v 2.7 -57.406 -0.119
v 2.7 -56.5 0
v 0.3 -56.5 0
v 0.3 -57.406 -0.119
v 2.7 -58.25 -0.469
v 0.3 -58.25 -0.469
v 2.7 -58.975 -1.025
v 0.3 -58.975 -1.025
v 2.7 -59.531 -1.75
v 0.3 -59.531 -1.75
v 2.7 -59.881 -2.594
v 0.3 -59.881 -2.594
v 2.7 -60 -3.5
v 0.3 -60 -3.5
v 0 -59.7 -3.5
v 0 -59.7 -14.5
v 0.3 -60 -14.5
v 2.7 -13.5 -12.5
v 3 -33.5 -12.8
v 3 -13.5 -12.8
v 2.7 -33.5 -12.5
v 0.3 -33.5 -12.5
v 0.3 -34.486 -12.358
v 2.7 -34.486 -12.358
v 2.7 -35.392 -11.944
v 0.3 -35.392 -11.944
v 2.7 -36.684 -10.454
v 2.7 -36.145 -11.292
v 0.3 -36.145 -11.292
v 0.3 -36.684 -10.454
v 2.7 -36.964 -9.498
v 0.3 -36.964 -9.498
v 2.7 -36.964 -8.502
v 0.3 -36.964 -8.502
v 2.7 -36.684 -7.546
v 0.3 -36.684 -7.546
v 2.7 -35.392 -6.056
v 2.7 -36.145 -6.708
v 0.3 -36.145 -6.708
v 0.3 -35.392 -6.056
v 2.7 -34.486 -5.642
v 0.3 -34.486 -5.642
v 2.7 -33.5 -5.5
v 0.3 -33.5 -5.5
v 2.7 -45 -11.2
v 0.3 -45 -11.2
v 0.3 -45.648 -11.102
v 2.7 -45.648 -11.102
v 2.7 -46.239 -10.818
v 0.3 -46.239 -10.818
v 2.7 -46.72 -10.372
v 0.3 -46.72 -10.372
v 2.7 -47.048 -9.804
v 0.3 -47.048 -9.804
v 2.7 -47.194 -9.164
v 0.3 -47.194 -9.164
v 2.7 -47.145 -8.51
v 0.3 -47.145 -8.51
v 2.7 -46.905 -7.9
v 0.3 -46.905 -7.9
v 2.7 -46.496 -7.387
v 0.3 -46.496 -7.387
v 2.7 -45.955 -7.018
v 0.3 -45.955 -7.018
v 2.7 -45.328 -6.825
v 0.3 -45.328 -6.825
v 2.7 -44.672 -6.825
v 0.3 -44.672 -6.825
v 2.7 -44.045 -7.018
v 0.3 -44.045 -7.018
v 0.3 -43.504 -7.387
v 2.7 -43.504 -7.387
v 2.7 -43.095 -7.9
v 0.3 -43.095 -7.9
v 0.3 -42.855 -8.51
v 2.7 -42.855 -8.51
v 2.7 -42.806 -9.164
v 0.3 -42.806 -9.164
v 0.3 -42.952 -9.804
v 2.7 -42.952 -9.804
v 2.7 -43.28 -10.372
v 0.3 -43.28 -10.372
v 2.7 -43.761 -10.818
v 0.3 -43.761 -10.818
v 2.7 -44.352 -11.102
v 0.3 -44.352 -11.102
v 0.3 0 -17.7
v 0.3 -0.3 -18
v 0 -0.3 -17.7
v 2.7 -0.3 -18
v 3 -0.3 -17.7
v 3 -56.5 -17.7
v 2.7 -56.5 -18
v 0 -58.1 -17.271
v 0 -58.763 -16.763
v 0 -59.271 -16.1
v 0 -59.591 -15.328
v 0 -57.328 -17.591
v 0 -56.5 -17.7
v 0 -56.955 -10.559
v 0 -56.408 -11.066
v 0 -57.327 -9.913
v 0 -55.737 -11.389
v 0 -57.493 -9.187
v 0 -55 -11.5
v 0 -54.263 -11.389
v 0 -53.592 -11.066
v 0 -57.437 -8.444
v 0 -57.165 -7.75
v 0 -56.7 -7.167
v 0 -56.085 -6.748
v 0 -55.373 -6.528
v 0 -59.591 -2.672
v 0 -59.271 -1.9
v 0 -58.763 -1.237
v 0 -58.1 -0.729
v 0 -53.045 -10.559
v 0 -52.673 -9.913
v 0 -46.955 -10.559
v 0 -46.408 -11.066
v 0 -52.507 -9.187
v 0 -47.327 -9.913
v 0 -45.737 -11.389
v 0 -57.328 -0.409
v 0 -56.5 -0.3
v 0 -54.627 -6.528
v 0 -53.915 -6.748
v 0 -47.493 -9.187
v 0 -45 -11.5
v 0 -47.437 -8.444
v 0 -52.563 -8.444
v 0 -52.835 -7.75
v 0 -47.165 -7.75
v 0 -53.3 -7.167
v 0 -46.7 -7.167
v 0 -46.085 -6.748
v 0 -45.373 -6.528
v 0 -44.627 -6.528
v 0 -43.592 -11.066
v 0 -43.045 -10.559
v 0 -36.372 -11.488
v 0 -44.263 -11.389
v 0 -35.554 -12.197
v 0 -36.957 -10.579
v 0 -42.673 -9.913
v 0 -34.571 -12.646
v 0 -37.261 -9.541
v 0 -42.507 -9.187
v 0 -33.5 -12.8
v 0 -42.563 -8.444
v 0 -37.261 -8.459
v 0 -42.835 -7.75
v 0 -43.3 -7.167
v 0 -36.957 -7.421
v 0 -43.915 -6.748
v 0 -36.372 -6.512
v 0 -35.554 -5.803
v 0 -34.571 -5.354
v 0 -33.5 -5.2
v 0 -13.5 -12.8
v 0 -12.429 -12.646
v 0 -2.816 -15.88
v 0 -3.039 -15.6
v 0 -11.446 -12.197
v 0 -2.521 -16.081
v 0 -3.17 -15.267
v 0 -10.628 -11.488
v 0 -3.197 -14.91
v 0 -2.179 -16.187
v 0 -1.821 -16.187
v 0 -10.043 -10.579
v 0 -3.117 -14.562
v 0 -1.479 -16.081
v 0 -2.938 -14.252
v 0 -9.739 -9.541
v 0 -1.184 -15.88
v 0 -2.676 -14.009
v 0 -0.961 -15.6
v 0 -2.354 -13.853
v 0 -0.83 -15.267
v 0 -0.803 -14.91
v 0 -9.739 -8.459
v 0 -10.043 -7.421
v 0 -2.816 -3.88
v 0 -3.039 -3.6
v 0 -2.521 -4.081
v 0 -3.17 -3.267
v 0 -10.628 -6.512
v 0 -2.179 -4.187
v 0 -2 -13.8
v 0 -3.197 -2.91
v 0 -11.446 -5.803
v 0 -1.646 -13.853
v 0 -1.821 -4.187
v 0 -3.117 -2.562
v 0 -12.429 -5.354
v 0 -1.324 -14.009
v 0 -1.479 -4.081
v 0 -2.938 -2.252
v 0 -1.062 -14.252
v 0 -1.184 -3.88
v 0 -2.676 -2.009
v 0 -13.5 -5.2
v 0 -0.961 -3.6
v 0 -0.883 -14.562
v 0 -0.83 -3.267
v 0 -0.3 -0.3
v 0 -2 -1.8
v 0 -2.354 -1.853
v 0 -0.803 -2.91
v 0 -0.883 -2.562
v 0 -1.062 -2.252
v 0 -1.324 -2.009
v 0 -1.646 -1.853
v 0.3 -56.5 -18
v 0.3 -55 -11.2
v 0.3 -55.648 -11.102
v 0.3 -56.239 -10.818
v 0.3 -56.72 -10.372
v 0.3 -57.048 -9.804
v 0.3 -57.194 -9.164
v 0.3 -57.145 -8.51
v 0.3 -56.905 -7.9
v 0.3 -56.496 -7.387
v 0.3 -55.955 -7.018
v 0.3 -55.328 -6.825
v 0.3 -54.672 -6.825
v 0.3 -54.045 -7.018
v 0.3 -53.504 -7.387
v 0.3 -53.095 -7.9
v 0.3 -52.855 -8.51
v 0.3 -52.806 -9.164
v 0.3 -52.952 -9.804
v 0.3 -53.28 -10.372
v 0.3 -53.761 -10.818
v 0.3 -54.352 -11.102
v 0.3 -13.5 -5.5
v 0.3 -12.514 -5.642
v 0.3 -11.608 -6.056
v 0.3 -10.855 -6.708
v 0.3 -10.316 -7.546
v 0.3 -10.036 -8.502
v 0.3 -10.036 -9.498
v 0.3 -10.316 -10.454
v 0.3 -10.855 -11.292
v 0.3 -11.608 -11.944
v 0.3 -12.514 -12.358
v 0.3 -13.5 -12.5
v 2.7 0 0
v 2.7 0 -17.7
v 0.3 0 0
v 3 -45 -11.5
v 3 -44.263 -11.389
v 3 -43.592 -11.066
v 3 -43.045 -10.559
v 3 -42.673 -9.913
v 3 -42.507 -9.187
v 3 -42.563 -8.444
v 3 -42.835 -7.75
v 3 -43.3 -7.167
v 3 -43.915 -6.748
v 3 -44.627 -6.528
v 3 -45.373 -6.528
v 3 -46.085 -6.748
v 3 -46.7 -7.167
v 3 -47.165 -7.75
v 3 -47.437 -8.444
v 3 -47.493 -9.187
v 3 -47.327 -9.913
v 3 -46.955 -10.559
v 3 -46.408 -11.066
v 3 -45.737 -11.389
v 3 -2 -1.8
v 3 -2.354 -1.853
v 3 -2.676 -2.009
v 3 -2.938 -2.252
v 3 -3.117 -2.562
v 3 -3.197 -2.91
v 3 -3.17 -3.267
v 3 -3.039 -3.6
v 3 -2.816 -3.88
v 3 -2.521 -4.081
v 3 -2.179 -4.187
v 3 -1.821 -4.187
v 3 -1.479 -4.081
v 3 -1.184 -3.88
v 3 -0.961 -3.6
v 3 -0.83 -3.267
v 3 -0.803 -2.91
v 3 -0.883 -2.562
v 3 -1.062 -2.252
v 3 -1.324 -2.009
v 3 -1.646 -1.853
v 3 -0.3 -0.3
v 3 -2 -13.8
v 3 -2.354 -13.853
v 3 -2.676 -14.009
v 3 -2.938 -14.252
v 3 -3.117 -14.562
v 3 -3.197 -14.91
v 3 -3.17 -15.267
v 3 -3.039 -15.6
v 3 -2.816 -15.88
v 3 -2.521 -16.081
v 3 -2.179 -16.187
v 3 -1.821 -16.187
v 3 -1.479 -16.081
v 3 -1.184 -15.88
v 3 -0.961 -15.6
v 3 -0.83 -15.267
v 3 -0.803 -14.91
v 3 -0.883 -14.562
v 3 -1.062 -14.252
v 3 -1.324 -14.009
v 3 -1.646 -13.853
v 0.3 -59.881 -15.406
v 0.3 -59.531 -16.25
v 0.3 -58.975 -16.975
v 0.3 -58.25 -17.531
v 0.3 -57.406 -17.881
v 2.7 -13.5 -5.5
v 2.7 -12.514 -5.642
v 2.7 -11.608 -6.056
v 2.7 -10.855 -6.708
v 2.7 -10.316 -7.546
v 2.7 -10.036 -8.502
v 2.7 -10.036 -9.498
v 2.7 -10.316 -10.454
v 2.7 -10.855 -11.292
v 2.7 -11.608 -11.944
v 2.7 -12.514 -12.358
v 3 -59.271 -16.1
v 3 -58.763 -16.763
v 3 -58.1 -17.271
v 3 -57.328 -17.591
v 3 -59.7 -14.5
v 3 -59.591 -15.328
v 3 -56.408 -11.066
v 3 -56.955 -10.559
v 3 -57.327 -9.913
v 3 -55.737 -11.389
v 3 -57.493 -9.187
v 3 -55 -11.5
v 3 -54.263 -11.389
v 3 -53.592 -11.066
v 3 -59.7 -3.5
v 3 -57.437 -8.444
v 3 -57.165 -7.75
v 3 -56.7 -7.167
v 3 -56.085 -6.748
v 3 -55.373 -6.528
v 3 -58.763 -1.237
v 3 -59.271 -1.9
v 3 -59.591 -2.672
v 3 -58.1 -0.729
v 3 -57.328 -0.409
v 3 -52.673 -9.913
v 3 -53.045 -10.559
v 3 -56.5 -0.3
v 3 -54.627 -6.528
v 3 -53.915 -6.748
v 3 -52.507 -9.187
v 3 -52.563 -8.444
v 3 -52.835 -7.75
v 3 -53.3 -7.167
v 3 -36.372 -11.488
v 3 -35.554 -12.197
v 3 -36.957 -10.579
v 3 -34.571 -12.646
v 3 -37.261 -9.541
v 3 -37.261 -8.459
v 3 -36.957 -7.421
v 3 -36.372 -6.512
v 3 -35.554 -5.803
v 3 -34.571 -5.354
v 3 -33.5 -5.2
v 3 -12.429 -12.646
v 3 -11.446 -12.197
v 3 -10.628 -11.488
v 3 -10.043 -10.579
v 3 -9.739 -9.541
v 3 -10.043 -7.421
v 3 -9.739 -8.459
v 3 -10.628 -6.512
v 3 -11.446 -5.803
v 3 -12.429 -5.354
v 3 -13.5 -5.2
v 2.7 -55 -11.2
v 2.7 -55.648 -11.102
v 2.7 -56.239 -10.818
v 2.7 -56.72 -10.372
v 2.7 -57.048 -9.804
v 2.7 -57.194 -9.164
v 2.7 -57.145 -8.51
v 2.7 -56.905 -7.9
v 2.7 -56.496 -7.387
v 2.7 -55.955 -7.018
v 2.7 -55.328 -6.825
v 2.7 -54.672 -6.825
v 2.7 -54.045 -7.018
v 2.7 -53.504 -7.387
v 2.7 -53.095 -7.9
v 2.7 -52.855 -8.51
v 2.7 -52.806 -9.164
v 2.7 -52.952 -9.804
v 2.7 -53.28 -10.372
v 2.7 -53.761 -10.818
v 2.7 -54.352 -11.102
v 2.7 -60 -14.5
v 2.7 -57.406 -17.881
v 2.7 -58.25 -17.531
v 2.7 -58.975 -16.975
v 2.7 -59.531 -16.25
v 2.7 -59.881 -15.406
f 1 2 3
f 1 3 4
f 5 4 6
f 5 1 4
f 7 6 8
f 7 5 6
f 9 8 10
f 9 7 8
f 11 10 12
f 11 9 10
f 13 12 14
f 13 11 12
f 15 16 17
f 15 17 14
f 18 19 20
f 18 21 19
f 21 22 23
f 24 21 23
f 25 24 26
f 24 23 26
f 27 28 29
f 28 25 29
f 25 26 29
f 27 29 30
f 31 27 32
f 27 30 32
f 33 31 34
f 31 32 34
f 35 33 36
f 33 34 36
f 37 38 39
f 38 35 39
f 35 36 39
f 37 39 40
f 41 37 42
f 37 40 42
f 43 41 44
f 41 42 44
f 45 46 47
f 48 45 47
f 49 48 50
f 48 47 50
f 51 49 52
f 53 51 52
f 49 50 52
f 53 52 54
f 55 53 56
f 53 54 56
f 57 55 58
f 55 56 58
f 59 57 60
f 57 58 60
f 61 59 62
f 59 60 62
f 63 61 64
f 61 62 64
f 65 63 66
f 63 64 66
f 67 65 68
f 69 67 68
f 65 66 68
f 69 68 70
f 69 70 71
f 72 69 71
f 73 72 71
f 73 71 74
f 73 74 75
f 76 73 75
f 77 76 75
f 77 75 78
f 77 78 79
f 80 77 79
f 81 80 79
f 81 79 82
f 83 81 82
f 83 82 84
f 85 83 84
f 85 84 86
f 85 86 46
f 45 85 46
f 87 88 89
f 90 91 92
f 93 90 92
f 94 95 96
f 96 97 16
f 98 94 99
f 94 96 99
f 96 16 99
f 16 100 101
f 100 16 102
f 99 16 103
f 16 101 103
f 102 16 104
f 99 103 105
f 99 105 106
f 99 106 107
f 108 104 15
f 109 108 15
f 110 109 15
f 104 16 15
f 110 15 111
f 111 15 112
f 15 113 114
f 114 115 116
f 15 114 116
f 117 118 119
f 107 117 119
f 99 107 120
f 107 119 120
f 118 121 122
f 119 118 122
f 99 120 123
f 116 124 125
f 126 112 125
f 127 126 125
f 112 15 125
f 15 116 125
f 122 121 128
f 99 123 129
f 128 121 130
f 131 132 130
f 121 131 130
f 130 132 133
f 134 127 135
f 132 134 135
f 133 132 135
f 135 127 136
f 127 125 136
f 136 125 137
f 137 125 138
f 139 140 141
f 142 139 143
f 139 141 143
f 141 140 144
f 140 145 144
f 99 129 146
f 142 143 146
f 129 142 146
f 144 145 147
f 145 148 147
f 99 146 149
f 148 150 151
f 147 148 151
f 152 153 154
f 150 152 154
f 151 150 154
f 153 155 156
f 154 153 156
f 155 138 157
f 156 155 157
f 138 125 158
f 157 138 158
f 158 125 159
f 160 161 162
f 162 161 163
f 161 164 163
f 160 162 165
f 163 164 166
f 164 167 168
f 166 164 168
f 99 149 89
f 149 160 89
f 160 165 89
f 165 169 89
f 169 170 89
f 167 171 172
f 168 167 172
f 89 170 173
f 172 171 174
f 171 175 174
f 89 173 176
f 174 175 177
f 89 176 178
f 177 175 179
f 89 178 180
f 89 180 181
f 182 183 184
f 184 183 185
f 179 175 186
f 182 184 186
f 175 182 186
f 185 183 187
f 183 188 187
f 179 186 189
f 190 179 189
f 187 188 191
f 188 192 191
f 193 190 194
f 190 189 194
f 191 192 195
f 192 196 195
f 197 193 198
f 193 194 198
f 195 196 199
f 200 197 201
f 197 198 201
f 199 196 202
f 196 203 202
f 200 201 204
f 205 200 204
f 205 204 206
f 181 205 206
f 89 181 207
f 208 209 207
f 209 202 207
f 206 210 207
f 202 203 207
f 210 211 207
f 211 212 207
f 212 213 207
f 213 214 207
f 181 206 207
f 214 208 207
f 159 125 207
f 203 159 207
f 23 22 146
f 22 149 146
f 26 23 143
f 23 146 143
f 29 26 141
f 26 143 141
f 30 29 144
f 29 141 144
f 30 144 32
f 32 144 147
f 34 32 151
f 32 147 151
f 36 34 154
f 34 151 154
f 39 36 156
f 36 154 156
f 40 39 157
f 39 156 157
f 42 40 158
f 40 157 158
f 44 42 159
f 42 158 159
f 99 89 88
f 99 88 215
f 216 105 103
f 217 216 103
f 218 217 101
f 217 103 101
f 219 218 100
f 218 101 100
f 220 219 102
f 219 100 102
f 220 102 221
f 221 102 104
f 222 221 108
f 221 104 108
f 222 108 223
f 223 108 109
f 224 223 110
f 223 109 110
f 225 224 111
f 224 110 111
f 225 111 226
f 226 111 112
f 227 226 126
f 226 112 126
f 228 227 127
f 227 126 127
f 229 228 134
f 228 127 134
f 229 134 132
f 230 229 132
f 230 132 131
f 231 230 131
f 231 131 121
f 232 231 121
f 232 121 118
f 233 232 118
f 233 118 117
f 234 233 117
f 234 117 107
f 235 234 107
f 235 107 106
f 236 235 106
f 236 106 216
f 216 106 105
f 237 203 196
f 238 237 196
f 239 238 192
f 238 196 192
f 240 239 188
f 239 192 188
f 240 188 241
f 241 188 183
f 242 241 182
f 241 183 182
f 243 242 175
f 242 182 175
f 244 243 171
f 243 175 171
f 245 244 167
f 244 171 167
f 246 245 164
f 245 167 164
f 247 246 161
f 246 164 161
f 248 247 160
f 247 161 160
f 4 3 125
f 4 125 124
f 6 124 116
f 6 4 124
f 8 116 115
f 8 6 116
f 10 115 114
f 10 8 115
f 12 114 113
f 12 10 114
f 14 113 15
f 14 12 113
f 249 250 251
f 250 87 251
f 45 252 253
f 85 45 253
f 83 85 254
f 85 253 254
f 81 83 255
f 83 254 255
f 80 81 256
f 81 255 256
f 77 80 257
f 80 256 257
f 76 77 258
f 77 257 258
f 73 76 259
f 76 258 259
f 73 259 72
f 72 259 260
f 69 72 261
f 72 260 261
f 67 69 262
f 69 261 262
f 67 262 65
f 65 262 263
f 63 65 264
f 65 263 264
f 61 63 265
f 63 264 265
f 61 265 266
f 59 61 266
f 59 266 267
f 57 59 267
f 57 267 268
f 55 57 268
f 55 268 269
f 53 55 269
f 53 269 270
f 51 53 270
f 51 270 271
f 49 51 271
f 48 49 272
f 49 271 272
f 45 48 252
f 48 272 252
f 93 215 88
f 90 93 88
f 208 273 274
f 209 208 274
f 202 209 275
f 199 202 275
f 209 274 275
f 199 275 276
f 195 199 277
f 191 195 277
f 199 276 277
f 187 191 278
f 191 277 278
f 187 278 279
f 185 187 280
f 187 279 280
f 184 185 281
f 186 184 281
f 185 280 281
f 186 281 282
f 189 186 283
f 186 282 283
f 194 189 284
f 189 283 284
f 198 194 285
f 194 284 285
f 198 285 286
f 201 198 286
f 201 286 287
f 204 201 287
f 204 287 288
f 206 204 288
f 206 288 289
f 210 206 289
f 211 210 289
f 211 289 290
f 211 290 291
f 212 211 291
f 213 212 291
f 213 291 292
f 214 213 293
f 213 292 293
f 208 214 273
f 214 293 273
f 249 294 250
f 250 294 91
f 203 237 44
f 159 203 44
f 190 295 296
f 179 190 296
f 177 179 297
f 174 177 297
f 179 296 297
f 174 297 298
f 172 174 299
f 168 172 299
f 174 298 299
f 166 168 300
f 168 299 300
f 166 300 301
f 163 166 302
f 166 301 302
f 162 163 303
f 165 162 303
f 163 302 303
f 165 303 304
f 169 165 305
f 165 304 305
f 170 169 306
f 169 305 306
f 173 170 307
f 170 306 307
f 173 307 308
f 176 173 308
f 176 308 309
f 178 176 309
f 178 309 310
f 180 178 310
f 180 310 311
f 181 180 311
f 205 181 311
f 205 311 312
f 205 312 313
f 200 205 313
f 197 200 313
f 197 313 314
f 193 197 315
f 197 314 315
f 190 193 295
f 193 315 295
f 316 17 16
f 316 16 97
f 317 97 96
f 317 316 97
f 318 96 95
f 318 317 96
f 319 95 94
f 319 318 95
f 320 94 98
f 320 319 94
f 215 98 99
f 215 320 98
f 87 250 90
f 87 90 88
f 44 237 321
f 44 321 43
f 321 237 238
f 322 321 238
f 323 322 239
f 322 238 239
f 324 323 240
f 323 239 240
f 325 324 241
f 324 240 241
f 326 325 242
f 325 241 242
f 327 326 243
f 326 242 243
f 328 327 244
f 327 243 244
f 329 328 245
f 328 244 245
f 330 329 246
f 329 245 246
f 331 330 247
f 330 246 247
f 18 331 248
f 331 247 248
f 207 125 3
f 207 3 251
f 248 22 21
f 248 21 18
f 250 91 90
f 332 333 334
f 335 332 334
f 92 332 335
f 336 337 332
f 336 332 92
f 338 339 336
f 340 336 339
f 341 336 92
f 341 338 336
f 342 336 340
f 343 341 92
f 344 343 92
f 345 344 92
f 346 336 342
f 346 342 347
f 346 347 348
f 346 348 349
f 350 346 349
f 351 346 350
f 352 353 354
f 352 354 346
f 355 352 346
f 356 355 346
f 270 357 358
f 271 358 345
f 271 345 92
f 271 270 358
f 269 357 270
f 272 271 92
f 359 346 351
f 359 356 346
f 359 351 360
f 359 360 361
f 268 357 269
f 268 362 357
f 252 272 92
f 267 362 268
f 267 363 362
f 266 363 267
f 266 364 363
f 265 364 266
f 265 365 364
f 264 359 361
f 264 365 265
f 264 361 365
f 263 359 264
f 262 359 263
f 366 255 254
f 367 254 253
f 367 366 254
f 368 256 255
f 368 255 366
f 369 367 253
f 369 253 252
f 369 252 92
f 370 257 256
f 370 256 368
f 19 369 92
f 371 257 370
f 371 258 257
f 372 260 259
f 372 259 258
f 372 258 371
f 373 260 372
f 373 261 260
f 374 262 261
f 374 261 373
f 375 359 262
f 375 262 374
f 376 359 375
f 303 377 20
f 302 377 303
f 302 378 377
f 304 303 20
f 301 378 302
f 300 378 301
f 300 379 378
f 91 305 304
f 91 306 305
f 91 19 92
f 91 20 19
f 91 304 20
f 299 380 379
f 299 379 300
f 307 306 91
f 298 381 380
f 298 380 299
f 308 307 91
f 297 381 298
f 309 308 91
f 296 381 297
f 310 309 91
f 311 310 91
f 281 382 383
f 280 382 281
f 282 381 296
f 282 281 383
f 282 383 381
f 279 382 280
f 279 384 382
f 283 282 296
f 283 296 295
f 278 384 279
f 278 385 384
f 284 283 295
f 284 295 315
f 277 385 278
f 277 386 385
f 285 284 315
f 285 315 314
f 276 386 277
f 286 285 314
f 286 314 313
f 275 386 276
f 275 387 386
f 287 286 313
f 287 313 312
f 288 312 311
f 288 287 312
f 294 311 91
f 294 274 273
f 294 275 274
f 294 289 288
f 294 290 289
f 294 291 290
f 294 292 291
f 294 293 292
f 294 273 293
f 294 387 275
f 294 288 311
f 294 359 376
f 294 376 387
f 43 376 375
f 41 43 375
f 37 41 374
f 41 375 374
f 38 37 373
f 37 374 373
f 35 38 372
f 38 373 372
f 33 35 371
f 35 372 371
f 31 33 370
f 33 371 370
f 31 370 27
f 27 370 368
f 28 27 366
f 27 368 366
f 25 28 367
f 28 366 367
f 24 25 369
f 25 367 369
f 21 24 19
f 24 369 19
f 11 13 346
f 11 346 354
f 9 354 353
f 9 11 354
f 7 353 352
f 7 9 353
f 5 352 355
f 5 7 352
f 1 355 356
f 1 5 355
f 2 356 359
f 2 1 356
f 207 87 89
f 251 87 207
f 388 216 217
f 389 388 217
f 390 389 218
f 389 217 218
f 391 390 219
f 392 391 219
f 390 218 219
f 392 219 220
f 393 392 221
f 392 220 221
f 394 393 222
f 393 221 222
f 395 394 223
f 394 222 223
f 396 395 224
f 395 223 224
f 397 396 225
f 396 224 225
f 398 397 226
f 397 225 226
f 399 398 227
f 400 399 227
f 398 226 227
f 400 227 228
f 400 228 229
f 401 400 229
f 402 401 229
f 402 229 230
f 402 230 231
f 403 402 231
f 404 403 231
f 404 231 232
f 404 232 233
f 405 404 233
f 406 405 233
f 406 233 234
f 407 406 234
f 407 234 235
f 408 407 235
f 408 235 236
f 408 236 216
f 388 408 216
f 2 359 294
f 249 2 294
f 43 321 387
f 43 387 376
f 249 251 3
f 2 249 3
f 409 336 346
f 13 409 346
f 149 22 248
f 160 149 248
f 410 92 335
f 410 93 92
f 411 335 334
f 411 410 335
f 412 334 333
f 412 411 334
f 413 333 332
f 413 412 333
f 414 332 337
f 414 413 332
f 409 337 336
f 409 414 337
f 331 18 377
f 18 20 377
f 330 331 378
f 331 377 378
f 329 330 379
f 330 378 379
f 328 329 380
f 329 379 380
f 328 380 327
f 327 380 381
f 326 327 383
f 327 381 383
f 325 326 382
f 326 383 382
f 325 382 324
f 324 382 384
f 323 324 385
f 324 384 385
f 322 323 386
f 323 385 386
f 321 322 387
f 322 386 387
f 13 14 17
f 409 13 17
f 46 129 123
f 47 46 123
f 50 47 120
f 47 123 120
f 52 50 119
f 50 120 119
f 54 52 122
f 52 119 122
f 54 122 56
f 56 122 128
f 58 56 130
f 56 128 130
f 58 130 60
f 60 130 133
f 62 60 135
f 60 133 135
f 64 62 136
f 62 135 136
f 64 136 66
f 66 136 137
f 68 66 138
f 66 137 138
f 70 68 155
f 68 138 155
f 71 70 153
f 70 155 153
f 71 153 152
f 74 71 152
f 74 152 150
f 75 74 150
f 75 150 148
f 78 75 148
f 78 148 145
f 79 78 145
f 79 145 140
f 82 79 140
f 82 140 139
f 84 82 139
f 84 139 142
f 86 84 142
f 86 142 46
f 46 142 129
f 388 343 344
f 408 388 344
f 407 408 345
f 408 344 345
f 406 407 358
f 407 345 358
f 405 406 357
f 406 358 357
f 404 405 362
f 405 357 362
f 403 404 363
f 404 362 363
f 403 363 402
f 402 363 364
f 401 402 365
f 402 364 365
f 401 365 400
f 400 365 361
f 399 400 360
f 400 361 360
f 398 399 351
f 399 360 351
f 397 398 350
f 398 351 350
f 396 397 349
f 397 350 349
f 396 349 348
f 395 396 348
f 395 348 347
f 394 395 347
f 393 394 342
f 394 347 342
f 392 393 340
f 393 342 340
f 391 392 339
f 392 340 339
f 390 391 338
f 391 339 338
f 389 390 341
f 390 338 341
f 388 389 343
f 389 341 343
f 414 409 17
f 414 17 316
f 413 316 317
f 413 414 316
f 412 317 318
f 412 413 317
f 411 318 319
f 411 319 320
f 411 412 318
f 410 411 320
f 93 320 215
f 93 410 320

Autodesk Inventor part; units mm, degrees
ref_plane "YZ Plane" through (0, 0, 0) normal (1, 0, 0) x (0, 1, 0)
ref_plane "XZ Plane" through (0, 0, 0) normal (0, 1, 0) x (-1, 0, 0)
ref_plane "XY Plane" through (0, 0, 0) normal (0, 0, 1) x (1, 0, 0)
sketch "Sketch1" plane through (0, 0, 0) normal (1, 0, 0) x (0, 1, 0)
  line L0 (0, 0) -> (-60, 0)
  line L1 (-60, 0) -> (-60, -18)
  line L2 (-60, -18) -> (0, -18)
  line L3 (0, -18) -> (0, 0)
  line L4 (-13.5, -5.5) -> (-33.5, -5.5)
  line L5 (-37, -9) -> (-37, -9)
  line L6 (-33.5, -12.5) -> (-13.5, -12.5)
  line L7 (-10, -9) -> (-10, -9)
  arc A0 (-10, -9) -> (-13.5, -5.5) centre (-13.5, -9) ccw
  arc A1 (-13.5, -12.5) -> (-10, -9) centre (-13.5, -9) ccw
  arc A2 (-37, -9) -> (-33.5, -12.5) centre (-33.5, -9) ccw
  arc A3 (-33.5, -5.5) -> (-37, -9) centre (-33.5, -9) ccw
  point P0 (-37, -12.5)
  point P1 (-37, -5.5)
  point P2 (-10, -12.5)
  dimension "d0" = 60
  dimension "d1" = 18
  dimension "d2" = 27
  dimension "d3" = 7
  dimension "d4" = 5.5
  dimension "d5" = 10
  dimension "d6" = 3.5
extrude "Extrusion1" add sketch "Sketch1" along normal blind 3
sketch "Sketch2" plane through (3, 0, 0) normal (1, 0, 0) x (0, 0, -1)
  line L0 (18, -60) -> (18, 0) projected
  line L1 (0, -60) -> (18, -60) projected
  point P0 (0, 0)
  point P1 (9, -45)
  point P2 (9, -55)
  dimension "d9" = 9
  dimension "d10" = 9
  dimension "d11" = 5
  dimension "d12" = 10
hole "Hole1" at (3, -45, -9) at (3, -55, -9) direction (-1, 0, 0) diameter 4.4 depth 8.8 tip angle 118
fillet "Fillet1" radius 3.5 2 edges at (1.5, -60, 0) (1.5, -60, -18)
chamfer "Chamfer1" distance 0.3 angle 45 25 edges at (3, 0, -9) (3, -28.25, -18) (3, -58.9749, -16.9749) (3, -60, -9) (3, -58.9749, -1.0251) (3, -28.25, 0) (1.5, 0, -18) (0, -28.25, -18) (0, -58.9749, -16.9749) (0, -60, -9) (0, -58.9749, -1.0251) (0, -28.25, 0) (0, 0, -9) (0, -10, -9) (0, -23.5, -5.5) (0, -37, -9) (0, -23.5, -12.5) (3, -23.5, -5.5) (3, -10, -9) (3, -23.5, -12.5) (3, -37, -9) (0, -55, -6.8) (0, -45, -6.8) (3, -55, -6.8) (3, -45, -6.8)
sketch "Sketch3" plane through (0, 0, 0) normal (-1, 0, 0) x (0, 0, 1)
  line L0 (-18, -0.3) -> (-18, -56.5) projected
  line L1 (0, -56.5) -> (0, 0) projected
  line L2 (0, 0) -> (-17.7, 0) projected
  point P0 (-15, -2)
  point P1 (-3, -2)
  dimension "d24" = 3
  dimension "d25" = 3
  dimension "d26" = 2
  dimension "d27" = 2
hole "Hole2" at (0, -2, -15) at (0, -2, -3) direction (1, 0, 0) diameter 2.4 depth 8.8 tip angle 118
properties part number "Ramka3" material "Steel"
